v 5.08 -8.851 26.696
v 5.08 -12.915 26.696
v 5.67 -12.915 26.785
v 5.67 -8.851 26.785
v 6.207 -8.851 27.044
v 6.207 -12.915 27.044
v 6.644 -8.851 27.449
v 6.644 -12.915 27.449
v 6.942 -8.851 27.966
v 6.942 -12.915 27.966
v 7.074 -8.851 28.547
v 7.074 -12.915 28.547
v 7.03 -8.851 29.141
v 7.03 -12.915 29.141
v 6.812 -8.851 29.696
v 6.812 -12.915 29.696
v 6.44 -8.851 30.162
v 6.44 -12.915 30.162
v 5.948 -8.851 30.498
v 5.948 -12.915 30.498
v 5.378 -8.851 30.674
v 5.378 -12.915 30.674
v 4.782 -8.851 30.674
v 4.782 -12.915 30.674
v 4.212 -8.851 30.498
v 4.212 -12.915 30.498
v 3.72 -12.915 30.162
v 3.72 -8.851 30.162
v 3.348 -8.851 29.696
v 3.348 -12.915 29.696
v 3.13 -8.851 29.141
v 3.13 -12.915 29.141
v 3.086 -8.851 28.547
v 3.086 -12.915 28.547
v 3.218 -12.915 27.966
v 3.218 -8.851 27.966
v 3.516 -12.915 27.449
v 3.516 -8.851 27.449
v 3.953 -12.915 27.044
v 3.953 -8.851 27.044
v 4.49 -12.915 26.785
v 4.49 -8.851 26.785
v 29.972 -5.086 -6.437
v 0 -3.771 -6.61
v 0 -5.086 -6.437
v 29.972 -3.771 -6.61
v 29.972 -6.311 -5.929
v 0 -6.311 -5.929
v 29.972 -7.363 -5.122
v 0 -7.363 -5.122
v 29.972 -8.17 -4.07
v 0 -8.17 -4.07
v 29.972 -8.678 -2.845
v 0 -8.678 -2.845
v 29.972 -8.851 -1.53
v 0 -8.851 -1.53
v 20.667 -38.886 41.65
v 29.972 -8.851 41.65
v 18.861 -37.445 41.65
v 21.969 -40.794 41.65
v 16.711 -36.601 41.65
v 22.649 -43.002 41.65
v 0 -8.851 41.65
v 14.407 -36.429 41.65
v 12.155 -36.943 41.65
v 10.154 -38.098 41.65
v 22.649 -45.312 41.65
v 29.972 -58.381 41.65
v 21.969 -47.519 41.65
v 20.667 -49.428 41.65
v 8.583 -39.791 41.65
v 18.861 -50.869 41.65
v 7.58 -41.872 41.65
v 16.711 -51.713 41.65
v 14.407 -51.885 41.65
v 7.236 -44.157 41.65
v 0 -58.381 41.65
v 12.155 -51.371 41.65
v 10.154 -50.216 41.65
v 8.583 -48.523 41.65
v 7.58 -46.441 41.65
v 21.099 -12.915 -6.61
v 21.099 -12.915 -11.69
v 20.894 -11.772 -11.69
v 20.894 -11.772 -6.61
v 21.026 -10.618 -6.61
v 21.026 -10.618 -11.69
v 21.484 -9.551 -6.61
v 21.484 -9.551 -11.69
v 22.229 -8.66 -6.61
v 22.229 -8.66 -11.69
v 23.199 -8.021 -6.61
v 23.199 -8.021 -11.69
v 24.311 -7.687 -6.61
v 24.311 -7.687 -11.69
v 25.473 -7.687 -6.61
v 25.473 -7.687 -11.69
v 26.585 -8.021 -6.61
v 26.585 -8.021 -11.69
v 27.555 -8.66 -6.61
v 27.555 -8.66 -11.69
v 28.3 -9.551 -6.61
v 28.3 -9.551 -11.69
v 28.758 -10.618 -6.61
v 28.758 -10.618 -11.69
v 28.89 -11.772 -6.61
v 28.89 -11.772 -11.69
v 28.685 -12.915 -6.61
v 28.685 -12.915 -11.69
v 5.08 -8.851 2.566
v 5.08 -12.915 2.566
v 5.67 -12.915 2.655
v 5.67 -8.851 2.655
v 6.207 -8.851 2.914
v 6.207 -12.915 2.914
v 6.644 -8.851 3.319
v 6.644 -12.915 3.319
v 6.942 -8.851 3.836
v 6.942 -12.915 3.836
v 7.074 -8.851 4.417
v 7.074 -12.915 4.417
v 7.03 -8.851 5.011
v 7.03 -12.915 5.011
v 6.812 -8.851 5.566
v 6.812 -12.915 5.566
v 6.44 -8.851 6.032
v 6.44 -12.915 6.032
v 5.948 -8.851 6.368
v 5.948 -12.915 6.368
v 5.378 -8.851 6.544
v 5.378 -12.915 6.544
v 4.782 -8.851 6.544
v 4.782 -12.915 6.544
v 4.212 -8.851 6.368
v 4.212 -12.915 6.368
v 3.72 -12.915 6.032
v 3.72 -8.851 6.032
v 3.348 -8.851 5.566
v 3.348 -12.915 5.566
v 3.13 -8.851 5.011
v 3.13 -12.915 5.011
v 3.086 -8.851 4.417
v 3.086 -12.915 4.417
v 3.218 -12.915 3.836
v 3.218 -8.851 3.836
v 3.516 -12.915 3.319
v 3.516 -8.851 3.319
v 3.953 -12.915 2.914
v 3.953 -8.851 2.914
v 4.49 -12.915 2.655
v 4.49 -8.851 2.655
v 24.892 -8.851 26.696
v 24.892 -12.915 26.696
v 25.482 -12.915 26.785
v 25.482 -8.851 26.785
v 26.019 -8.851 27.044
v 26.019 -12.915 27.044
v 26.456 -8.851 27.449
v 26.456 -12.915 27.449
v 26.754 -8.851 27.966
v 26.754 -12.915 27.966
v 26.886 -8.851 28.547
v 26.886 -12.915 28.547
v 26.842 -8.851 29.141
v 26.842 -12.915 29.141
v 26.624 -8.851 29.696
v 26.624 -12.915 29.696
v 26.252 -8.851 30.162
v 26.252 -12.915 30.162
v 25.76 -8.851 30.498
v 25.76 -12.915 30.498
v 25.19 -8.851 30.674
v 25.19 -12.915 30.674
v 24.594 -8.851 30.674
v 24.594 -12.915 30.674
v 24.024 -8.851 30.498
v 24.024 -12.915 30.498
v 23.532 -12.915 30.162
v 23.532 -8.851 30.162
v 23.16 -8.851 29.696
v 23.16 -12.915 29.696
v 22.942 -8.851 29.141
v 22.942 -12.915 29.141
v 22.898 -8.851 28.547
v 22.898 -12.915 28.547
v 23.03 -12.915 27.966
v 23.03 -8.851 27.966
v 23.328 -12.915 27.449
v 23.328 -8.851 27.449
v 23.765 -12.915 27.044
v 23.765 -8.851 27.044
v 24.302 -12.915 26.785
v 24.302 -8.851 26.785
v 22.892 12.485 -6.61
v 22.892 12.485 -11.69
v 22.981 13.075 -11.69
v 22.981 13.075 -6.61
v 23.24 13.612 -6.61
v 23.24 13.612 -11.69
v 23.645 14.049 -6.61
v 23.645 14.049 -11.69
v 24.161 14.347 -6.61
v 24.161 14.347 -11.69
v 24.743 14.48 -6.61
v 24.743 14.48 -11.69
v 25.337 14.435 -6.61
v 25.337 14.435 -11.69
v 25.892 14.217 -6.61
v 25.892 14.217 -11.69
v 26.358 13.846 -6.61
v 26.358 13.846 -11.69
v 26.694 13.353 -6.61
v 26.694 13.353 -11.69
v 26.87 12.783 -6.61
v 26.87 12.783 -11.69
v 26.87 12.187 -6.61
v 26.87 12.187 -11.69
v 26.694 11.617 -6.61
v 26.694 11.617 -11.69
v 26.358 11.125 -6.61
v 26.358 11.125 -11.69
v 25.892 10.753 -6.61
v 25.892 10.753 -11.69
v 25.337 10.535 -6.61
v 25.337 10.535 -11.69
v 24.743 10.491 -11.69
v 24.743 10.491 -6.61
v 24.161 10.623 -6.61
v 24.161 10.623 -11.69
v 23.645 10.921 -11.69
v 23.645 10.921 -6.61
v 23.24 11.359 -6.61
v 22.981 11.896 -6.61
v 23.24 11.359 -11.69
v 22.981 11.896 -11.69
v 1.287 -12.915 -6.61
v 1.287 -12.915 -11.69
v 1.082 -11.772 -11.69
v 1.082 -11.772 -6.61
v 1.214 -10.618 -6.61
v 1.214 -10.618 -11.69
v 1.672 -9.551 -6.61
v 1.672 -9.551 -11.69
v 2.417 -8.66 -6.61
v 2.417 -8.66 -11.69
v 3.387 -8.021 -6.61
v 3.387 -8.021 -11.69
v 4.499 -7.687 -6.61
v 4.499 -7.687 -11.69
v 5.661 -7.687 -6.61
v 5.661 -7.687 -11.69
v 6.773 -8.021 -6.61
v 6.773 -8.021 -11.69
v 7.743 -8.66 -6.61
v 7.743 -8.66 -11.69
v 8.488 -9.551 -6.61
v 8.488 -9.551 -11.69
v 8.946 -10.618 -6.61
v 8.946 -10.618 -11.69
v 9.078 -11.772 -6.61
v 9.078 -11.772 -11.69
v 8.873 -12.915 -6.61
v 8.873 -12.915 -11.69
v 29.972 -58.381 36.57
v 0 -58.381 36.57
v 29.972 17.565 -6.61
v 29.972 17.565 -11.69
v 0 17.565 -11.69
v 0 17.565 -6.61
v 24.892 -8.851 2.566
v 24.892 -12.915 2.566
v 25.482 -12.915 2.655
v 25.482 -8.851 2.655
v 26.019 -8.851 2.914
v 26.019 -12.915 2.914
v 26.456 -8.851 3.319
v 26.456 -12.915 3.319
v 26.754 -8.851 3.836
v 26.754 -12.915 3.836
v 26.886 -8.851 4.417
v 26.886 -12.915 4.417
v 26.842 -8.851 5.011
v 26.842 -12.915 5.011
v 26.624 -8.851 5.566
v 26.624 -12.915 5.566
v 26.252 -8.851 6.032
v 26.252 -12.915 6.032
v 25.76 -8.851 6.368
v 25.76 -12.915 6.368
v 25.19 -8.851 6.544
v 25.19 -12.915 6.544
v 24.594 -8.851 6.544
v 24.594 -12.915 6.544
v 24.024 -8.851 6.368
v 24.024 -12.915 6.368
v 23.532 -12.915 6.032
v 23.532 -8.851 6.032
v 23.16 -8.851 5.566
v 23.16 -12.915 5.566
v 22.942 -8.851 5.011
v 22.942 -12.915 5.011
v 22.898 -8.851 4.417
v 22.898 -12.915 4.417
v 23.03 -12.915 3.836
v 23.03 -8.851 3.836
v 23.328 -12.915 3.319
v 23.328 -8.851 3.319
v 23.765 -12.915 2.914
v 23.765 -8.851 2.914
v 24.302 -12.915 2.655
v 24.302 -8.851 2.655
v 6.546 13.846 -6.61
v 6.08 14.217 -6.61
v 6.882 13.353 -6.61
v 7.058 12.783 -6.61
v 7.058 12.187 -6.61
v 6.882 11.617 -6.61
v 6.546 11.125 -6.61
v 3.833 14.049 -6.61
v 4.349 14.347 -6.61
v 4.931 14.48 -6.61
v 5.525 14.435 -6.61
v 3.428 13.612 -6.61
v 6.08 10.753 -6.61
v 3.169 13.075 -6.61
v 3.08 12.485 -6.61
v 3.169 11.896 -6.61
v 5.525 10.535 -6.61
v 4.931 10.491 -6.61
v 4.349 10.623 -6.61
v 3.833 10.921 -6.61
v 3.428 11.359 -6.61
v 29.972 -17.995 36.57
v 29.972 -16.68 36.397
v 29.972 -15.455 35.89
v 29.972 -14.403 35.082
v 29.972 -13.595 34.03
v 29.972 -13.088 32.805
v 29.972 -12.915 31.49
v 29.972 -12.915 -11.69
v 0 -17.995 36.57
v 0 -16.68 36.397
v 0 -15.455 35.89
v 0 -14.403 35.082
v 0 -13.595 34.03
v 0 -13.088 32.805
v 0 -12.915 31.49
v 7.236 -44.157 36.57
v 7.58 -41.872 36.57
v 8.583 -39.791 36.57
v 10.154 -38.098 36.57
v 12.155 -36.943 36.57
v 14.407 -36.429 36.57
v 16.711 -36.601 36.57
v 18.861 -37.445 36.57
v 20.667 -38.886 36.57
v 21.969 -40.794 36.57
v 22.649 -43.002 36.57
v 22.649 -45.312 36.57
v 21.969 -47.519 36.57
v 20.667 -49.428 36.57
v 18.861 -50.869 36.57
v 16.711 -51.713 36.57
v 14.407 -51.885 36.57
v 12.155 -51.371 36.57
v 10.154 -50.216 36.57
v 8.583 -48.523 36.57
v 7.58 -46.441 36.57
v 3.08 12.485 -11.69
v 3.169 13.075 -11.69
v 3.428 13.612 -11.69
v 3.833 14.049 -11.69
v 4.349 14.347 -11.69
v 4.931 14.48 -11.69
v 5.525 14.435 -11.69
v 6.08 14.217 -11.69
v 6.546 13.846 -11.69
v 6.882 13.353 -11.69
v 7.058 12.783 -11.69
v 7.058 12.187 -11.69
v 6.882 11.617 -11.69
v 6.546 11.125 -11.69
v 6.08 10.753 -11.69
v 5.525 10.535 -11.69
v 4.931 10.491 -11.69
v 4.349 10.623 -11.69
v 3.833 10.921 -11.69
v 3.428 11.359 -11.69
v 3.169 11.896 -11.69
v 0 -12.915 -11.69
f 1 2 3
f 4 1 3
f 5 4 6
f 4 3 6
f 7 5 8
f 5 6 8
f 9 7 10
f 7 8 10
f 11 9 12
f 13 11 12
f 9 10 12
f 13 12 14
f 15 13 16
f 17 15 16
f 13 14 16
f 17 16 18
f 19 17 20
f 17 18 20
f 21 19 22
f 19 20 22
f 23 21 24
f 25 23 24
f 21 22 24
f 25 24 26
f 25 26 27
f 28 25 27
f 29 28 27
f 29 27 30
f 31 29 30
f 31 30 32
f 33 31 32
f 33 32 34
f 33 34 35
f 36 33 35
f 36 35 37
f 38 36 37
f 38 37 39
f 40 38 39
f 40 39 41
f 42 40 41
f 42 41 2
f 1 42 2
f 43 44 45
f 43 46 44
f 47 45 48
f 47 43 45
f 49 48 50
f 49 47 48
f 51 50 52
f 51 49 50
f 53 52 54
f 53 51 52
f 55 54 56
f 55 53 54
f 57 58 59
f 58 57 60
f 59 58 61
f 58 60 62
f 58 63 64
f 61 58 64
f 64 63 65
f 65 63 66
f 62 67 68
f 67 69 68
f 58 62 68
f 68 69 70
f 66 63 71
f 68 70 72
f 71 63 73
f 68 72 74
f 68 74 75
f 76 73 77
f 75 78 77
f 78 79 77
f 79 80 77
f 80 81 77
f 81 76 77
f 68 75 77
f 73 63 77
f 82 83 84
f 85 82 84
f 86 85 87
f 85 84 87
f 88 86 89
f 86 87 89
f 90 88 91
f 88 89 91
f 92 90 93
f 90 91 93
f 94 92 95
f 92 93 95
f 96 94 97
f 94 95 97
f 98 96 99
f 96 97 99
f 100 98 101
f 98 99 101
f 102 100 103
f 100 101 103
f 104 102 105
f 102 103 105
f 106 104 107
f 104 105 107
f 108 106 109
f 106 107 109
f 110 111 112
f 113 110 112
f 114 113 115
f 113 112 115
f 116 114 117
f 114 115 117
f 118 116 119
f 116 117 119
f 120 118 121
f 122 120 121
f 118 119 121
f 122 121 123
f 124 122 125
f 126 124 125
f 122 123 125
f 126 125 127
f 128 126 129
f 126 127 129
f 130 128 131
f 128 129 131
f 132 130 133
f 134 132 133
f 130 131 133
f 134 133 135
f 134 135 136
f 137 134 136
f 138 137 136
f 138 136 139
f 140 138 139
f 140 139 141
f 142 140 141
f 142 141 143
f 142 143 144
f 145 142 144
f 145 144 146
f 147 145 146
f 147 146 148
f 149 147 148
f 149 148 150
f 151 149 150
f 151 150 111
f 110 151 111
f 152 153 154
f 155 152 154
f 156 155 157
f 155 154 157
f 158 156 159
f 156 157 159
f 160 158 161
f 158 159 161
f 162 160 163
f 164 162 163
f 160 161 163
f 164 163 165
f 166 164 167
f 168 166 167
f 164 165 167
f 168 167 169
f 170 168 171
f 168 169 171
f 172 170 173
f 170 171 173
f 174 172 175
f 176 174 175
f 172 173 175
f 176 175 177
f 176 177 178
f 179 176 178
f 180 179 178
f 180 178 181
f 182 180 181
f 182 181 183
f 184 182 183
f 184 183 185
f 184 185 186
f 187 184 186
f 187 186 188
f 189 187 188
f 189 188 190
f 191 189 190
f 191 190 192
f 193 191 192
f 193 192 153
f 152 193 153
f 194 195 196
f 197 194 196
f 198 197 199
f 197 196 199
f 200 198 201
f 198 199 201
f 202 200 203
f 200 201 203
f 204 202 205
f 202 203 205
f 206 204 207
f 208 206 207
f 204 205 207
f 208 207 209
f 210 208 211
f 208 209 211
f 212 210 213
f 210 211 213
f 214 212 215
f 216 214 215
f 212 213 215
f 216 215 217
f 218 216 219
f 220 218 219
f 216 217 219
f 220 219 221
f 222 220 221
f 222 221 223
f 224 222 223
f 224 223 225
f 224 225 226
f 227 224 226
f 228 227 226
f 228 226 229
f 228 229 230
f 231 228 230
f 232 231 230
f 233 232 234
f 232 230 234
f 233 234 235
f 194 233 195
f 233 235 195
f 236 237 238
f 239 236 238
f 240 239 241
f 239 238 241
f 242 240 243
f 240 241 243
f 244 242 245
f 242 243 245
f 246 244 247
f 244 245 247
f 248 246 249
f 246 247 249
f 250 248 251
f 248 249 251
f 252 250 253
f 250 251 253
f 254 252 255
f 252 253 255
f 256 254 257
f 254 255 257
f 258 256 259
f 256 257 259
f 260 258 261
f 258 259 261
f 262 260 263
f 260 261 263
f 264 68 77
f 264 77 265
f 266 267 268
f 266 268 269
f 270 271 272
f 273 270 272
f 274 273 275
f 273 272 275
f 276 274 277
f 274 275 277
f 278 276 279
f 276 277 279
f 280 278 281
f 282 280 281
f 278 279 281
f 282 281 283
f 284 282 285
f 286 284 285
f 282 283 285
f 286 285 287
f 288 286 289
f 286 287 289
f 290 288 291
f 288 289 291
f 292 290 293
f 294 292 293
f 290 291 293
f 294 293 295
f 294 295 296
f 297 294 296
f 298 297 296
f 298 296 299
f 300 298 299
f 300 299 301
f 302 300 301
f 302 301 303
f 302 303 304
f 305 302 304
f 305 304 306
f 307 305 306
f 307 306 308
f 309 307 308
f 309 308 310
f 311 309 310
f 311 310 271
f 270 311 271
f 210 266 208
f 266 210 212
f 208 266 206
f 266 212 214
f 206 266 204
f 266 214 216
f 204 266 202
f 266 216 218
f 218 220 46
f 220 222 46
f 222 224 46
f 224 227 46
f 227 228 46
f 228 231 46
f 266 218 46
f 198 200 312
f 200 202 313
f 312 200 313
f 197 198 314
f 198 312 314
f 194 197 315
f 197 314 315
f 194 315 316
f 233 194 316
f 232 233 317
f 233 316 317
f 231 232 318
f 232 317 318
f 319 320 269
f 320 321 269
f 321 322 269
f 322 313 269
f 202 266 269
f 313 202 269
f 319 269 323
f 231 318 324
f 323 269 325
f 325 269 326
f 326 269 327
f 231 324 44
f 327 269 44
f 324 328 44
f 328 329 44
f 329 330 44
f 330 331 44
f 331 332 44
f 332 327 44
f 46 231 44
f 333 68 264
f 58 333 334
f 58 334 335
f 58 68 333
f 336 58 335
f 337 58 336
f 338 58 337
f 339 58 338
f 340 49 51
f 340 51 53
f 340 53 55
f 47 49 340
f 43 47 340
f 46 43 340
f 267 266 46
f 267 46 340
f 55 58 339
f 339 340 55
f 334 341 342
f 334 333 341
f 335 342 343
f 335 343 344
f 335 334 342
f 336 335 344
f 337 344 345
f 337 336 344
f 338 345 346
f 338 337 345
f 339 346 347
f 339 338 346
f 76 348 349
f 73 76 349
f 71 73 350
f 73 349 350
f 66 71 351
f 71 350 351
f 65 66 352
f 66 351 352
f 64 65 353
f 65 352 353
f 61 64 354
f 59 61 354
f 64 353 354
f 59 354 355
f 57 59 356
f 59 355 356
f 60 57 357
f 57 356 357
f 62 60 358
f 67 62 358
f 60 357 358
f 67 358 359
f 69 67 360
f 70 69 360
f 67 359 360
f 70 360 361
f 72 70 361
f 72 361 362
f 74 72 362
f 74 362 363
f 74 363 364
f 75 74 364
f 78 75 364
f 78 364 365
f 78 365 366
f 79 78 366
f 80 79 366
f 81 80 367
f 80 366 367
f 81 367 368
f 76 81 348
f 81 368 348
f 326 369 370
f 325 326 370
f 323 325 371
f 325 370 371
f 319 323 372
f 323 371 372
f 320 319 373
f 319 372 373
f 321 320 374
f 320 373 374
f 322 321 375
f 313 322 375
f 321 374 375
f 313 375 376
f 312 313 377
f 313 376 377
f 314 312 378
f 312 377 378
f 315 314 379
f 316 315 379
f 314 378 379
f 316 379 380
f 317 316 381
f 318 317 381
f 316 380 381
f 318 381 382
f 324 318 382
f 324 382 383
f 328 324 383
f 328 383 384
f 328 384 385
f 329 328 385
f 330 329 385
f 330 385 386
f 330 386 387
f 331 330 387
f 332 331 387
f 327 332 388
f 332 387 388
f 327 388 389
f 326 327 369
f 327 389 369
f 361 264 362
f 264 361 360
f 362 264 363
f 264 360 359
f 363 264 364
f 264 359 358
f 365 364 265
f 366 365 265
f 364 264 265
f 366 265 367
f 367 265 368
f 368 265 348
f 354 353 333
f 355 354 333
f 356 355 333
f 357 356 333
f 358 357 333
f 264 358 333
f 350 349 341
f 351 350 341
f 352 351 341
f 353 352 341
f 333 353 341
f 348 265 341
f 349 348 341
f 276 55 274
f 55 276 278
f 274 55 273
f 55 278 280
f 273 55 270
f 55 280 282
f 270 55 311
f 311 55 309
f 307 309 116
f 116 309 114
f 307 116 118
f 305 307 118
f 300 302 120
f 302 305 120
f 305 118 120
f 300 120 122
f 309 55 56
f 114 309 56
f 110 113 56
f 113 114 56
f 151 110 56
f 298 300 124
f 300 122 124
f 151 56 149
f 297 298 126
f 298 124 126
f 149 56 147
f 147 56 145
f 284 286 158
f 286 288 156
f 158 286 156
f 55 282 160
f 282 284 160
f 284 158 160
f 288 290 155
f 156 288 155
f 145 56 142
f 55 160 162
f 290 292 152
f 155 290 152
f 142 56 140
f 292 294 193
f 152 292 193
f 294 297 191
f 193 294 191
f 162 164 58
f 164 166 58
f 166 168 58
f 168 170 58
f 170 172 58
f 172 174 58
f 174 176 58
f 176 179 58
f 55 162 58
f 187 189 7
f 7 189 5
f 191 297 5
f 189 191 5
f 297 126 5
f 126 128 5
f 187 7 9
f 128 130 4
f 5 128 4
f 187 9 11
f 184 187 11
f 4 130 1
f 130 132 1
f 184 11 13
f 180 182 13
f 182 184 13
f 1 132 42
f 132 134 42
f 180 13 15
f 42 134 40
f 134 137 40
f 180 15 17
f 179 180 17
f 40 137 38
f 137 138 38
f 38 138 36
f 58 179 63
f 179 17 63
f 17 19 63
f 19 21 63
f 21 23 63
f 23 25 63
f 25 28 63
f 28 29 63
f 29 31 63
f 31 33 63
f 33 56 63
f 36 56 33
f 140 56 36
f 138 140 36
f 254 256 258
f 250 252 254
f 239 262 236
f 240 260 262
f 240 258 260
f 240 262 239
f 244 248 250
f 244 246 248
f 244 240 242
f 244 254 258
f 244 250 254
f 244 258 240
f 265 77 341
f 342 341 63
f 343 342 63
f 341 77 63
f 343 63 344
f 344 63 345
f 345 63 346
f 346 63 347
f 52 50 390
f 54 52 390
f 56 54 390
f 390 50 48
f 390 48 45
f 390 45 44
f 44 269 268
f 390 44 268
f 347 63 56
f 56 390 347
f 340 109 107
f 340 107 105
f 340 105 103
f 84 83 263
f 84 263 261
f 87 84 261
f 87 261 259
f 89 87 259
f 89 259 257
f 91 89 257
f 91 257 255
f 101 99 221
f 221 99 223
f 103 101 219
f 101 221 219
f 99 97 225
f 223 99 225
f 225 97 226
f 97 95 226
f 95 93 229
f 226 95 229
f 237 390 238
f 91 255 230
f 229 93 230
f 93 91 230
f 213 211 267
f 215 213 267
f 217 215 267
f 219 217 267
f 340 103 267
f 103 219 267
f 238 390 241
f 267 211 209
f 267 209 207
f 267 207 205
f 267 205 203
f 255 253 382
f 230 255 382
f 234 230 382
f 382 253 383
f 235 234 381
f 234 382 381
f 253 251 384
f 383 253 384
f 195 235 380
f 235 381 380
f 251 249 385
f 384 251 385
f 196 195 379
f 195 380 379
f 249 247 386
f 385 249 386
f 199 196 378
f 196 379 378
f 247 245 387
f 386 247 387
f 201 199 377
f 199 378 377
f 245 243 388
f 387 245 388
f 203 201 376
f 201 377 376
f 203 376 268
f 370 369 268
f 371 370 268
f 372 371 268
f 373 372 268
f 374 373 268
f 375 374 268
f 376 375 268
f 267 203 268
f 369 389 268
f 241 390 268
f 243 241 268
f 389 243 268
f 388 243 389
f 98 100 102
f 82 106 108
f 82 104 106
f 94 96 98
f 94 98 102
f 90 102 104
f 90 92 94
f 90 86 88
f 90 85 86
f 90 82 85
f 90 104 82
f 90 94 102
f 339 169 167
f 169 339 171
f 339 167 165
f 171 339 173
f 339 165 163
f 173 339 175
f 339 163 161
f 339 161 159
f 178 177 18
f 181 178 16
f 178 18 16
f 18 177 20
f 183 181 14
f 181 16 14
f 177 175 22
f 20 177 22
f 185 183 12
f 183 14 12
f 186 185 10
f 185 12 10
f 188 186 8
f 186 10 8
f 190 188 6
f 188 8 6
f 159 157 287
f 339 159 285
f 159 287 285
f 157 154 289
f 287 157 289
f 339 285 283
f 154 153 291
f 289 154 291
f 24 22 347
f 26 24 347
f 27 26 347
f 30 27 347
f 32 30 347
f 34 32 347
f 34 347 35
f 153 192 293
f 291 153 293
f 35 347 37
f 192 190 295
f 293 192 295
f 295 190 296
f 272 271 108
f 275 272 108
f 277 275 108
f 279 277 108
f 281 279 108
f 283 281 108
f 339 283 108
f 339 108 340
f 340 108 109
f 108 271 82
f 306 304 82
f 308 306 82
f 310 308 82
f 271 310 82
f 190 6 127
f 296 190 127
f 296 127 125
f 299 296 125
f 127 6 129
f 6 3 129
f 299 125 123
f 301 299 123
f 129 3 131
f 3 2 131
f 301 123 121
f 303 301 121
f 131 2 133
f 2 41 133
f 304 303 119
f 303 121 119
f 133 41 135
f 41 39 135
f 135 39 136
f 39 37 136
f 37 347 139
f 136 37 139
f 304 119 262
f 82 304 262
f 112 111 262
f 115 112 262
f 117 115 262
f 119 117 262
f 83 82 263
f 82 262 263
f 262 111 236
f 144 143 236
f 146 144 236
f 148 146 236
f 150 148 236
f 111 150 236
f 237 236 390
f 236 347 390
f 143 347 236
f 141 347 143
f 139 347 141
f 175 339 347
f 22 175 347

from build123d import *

# Parameters (mm, degrees)
BOSS_EXTRUDE1_DEPTH = 29.972
FILLET1_R           = 5.08
SKETCH3_R           = 2
SKETCH3_R_2         = 4
CUT_EXTRUDE1_DEPTH  = 5.08
SKETCH4_R           = 2
CUT_EXTRUDE2_DEPTH  = 29.972
SKETCH5_R           = 7.75
CUT_EXTRUDE3_DEPTH  = 5.08


with BuildPart() as part:
    # Sketch2 → Boss-Extrude1 (new body)
    with BuildSketch(Plane(origin=(0, 0, 0), x_dir=(0, 0, -1), z_dir=(1, 0, 0))):
        Polygon((6.609800113, 17.56515608), (6.609800113, -8.85084392), (-41.650199887, -8.85084392), (-41.650199887, -58.38084392), (-36.570199887, -58.38084392), (-36.570199887, -12.91484392), (11.689800113, -12.91484392), (11.689800113, 17.56515608), align=None)
    extrude(amount=BOSS_EXTRUDE1_DEPTH)

    # Fillet1
    fillet1_edges = [part.edges().sort_by_distance(p)[0] for p in [
        (14.986, -8.85084392, -6.609800113),
        (14.986, -12.91484392, 36.570199887),
    ]]
    fillet(fillet1_edges, radius=FILLET1_R)

    # Sketch3 → Cut-Extrude1 (cut)
    with BuildSketch(Plane(origin=(0, 0, -11.689800113), x_dir=(-1, 0, 0), z_dir=(0, 0, -1))):
        with Locations((-24.892, 12.48515608)):
            Circle(SKETCH3_R)
        with Locations((-5.08, 12.48515608)):
            Circle(SKETCH3_R)
        with Locations((-5.08, -11.64484392)):
            Circle(SKETCH3_R_2)
        with Locations((-24.892, -11.64484392)):
            Circle(SKETCH3_R_2)
    extrude(amount=-CUT_EXTRUDE1_DEPTH, mode=Mode.SUBTRACT)

    # Sketch4 → Cut-Extrude2 (cut)
    with BuildSketch(Plane.XZ.offset(12.91484392)):
        with Locations(Location((24.892, 4.566199887, 0), (0, 0, 270))):
            Circle(SKETCH4_R)
        with Locations(Location((5.08, 4.566199887, 0), (0, 0, 270))):
            Circle(SKETCH4_R)
        with Locations(Location((24.892, 28.696199887, 0), (0, 0, 270))):
            Circle(SKETCH4_R)
        with Locations(Location((5.08, 28.696199887, 0), (0, 0, 270))):
            Circle(SKETCH4_R)
    extrude(amount=-CUT_EXTRUDE2_DEPTH, mode=Mode.SUBTRACT)

    # Sketch5 → Cut-Extrude3 (cut)
    with BuildSketch(Plane(origin=(0, 0, 36.570199887), x_dir=(-1, 0, 0), z_dir=(0, 0, -1))):
        with Locations((-14.986, -44.15684392)):
            Circle(SKETCH5_R)
    extrude(amount=-CUT_EXTRUDE3_DEPTH, mode=Mode.SUBTRACT)


solid = part.part
